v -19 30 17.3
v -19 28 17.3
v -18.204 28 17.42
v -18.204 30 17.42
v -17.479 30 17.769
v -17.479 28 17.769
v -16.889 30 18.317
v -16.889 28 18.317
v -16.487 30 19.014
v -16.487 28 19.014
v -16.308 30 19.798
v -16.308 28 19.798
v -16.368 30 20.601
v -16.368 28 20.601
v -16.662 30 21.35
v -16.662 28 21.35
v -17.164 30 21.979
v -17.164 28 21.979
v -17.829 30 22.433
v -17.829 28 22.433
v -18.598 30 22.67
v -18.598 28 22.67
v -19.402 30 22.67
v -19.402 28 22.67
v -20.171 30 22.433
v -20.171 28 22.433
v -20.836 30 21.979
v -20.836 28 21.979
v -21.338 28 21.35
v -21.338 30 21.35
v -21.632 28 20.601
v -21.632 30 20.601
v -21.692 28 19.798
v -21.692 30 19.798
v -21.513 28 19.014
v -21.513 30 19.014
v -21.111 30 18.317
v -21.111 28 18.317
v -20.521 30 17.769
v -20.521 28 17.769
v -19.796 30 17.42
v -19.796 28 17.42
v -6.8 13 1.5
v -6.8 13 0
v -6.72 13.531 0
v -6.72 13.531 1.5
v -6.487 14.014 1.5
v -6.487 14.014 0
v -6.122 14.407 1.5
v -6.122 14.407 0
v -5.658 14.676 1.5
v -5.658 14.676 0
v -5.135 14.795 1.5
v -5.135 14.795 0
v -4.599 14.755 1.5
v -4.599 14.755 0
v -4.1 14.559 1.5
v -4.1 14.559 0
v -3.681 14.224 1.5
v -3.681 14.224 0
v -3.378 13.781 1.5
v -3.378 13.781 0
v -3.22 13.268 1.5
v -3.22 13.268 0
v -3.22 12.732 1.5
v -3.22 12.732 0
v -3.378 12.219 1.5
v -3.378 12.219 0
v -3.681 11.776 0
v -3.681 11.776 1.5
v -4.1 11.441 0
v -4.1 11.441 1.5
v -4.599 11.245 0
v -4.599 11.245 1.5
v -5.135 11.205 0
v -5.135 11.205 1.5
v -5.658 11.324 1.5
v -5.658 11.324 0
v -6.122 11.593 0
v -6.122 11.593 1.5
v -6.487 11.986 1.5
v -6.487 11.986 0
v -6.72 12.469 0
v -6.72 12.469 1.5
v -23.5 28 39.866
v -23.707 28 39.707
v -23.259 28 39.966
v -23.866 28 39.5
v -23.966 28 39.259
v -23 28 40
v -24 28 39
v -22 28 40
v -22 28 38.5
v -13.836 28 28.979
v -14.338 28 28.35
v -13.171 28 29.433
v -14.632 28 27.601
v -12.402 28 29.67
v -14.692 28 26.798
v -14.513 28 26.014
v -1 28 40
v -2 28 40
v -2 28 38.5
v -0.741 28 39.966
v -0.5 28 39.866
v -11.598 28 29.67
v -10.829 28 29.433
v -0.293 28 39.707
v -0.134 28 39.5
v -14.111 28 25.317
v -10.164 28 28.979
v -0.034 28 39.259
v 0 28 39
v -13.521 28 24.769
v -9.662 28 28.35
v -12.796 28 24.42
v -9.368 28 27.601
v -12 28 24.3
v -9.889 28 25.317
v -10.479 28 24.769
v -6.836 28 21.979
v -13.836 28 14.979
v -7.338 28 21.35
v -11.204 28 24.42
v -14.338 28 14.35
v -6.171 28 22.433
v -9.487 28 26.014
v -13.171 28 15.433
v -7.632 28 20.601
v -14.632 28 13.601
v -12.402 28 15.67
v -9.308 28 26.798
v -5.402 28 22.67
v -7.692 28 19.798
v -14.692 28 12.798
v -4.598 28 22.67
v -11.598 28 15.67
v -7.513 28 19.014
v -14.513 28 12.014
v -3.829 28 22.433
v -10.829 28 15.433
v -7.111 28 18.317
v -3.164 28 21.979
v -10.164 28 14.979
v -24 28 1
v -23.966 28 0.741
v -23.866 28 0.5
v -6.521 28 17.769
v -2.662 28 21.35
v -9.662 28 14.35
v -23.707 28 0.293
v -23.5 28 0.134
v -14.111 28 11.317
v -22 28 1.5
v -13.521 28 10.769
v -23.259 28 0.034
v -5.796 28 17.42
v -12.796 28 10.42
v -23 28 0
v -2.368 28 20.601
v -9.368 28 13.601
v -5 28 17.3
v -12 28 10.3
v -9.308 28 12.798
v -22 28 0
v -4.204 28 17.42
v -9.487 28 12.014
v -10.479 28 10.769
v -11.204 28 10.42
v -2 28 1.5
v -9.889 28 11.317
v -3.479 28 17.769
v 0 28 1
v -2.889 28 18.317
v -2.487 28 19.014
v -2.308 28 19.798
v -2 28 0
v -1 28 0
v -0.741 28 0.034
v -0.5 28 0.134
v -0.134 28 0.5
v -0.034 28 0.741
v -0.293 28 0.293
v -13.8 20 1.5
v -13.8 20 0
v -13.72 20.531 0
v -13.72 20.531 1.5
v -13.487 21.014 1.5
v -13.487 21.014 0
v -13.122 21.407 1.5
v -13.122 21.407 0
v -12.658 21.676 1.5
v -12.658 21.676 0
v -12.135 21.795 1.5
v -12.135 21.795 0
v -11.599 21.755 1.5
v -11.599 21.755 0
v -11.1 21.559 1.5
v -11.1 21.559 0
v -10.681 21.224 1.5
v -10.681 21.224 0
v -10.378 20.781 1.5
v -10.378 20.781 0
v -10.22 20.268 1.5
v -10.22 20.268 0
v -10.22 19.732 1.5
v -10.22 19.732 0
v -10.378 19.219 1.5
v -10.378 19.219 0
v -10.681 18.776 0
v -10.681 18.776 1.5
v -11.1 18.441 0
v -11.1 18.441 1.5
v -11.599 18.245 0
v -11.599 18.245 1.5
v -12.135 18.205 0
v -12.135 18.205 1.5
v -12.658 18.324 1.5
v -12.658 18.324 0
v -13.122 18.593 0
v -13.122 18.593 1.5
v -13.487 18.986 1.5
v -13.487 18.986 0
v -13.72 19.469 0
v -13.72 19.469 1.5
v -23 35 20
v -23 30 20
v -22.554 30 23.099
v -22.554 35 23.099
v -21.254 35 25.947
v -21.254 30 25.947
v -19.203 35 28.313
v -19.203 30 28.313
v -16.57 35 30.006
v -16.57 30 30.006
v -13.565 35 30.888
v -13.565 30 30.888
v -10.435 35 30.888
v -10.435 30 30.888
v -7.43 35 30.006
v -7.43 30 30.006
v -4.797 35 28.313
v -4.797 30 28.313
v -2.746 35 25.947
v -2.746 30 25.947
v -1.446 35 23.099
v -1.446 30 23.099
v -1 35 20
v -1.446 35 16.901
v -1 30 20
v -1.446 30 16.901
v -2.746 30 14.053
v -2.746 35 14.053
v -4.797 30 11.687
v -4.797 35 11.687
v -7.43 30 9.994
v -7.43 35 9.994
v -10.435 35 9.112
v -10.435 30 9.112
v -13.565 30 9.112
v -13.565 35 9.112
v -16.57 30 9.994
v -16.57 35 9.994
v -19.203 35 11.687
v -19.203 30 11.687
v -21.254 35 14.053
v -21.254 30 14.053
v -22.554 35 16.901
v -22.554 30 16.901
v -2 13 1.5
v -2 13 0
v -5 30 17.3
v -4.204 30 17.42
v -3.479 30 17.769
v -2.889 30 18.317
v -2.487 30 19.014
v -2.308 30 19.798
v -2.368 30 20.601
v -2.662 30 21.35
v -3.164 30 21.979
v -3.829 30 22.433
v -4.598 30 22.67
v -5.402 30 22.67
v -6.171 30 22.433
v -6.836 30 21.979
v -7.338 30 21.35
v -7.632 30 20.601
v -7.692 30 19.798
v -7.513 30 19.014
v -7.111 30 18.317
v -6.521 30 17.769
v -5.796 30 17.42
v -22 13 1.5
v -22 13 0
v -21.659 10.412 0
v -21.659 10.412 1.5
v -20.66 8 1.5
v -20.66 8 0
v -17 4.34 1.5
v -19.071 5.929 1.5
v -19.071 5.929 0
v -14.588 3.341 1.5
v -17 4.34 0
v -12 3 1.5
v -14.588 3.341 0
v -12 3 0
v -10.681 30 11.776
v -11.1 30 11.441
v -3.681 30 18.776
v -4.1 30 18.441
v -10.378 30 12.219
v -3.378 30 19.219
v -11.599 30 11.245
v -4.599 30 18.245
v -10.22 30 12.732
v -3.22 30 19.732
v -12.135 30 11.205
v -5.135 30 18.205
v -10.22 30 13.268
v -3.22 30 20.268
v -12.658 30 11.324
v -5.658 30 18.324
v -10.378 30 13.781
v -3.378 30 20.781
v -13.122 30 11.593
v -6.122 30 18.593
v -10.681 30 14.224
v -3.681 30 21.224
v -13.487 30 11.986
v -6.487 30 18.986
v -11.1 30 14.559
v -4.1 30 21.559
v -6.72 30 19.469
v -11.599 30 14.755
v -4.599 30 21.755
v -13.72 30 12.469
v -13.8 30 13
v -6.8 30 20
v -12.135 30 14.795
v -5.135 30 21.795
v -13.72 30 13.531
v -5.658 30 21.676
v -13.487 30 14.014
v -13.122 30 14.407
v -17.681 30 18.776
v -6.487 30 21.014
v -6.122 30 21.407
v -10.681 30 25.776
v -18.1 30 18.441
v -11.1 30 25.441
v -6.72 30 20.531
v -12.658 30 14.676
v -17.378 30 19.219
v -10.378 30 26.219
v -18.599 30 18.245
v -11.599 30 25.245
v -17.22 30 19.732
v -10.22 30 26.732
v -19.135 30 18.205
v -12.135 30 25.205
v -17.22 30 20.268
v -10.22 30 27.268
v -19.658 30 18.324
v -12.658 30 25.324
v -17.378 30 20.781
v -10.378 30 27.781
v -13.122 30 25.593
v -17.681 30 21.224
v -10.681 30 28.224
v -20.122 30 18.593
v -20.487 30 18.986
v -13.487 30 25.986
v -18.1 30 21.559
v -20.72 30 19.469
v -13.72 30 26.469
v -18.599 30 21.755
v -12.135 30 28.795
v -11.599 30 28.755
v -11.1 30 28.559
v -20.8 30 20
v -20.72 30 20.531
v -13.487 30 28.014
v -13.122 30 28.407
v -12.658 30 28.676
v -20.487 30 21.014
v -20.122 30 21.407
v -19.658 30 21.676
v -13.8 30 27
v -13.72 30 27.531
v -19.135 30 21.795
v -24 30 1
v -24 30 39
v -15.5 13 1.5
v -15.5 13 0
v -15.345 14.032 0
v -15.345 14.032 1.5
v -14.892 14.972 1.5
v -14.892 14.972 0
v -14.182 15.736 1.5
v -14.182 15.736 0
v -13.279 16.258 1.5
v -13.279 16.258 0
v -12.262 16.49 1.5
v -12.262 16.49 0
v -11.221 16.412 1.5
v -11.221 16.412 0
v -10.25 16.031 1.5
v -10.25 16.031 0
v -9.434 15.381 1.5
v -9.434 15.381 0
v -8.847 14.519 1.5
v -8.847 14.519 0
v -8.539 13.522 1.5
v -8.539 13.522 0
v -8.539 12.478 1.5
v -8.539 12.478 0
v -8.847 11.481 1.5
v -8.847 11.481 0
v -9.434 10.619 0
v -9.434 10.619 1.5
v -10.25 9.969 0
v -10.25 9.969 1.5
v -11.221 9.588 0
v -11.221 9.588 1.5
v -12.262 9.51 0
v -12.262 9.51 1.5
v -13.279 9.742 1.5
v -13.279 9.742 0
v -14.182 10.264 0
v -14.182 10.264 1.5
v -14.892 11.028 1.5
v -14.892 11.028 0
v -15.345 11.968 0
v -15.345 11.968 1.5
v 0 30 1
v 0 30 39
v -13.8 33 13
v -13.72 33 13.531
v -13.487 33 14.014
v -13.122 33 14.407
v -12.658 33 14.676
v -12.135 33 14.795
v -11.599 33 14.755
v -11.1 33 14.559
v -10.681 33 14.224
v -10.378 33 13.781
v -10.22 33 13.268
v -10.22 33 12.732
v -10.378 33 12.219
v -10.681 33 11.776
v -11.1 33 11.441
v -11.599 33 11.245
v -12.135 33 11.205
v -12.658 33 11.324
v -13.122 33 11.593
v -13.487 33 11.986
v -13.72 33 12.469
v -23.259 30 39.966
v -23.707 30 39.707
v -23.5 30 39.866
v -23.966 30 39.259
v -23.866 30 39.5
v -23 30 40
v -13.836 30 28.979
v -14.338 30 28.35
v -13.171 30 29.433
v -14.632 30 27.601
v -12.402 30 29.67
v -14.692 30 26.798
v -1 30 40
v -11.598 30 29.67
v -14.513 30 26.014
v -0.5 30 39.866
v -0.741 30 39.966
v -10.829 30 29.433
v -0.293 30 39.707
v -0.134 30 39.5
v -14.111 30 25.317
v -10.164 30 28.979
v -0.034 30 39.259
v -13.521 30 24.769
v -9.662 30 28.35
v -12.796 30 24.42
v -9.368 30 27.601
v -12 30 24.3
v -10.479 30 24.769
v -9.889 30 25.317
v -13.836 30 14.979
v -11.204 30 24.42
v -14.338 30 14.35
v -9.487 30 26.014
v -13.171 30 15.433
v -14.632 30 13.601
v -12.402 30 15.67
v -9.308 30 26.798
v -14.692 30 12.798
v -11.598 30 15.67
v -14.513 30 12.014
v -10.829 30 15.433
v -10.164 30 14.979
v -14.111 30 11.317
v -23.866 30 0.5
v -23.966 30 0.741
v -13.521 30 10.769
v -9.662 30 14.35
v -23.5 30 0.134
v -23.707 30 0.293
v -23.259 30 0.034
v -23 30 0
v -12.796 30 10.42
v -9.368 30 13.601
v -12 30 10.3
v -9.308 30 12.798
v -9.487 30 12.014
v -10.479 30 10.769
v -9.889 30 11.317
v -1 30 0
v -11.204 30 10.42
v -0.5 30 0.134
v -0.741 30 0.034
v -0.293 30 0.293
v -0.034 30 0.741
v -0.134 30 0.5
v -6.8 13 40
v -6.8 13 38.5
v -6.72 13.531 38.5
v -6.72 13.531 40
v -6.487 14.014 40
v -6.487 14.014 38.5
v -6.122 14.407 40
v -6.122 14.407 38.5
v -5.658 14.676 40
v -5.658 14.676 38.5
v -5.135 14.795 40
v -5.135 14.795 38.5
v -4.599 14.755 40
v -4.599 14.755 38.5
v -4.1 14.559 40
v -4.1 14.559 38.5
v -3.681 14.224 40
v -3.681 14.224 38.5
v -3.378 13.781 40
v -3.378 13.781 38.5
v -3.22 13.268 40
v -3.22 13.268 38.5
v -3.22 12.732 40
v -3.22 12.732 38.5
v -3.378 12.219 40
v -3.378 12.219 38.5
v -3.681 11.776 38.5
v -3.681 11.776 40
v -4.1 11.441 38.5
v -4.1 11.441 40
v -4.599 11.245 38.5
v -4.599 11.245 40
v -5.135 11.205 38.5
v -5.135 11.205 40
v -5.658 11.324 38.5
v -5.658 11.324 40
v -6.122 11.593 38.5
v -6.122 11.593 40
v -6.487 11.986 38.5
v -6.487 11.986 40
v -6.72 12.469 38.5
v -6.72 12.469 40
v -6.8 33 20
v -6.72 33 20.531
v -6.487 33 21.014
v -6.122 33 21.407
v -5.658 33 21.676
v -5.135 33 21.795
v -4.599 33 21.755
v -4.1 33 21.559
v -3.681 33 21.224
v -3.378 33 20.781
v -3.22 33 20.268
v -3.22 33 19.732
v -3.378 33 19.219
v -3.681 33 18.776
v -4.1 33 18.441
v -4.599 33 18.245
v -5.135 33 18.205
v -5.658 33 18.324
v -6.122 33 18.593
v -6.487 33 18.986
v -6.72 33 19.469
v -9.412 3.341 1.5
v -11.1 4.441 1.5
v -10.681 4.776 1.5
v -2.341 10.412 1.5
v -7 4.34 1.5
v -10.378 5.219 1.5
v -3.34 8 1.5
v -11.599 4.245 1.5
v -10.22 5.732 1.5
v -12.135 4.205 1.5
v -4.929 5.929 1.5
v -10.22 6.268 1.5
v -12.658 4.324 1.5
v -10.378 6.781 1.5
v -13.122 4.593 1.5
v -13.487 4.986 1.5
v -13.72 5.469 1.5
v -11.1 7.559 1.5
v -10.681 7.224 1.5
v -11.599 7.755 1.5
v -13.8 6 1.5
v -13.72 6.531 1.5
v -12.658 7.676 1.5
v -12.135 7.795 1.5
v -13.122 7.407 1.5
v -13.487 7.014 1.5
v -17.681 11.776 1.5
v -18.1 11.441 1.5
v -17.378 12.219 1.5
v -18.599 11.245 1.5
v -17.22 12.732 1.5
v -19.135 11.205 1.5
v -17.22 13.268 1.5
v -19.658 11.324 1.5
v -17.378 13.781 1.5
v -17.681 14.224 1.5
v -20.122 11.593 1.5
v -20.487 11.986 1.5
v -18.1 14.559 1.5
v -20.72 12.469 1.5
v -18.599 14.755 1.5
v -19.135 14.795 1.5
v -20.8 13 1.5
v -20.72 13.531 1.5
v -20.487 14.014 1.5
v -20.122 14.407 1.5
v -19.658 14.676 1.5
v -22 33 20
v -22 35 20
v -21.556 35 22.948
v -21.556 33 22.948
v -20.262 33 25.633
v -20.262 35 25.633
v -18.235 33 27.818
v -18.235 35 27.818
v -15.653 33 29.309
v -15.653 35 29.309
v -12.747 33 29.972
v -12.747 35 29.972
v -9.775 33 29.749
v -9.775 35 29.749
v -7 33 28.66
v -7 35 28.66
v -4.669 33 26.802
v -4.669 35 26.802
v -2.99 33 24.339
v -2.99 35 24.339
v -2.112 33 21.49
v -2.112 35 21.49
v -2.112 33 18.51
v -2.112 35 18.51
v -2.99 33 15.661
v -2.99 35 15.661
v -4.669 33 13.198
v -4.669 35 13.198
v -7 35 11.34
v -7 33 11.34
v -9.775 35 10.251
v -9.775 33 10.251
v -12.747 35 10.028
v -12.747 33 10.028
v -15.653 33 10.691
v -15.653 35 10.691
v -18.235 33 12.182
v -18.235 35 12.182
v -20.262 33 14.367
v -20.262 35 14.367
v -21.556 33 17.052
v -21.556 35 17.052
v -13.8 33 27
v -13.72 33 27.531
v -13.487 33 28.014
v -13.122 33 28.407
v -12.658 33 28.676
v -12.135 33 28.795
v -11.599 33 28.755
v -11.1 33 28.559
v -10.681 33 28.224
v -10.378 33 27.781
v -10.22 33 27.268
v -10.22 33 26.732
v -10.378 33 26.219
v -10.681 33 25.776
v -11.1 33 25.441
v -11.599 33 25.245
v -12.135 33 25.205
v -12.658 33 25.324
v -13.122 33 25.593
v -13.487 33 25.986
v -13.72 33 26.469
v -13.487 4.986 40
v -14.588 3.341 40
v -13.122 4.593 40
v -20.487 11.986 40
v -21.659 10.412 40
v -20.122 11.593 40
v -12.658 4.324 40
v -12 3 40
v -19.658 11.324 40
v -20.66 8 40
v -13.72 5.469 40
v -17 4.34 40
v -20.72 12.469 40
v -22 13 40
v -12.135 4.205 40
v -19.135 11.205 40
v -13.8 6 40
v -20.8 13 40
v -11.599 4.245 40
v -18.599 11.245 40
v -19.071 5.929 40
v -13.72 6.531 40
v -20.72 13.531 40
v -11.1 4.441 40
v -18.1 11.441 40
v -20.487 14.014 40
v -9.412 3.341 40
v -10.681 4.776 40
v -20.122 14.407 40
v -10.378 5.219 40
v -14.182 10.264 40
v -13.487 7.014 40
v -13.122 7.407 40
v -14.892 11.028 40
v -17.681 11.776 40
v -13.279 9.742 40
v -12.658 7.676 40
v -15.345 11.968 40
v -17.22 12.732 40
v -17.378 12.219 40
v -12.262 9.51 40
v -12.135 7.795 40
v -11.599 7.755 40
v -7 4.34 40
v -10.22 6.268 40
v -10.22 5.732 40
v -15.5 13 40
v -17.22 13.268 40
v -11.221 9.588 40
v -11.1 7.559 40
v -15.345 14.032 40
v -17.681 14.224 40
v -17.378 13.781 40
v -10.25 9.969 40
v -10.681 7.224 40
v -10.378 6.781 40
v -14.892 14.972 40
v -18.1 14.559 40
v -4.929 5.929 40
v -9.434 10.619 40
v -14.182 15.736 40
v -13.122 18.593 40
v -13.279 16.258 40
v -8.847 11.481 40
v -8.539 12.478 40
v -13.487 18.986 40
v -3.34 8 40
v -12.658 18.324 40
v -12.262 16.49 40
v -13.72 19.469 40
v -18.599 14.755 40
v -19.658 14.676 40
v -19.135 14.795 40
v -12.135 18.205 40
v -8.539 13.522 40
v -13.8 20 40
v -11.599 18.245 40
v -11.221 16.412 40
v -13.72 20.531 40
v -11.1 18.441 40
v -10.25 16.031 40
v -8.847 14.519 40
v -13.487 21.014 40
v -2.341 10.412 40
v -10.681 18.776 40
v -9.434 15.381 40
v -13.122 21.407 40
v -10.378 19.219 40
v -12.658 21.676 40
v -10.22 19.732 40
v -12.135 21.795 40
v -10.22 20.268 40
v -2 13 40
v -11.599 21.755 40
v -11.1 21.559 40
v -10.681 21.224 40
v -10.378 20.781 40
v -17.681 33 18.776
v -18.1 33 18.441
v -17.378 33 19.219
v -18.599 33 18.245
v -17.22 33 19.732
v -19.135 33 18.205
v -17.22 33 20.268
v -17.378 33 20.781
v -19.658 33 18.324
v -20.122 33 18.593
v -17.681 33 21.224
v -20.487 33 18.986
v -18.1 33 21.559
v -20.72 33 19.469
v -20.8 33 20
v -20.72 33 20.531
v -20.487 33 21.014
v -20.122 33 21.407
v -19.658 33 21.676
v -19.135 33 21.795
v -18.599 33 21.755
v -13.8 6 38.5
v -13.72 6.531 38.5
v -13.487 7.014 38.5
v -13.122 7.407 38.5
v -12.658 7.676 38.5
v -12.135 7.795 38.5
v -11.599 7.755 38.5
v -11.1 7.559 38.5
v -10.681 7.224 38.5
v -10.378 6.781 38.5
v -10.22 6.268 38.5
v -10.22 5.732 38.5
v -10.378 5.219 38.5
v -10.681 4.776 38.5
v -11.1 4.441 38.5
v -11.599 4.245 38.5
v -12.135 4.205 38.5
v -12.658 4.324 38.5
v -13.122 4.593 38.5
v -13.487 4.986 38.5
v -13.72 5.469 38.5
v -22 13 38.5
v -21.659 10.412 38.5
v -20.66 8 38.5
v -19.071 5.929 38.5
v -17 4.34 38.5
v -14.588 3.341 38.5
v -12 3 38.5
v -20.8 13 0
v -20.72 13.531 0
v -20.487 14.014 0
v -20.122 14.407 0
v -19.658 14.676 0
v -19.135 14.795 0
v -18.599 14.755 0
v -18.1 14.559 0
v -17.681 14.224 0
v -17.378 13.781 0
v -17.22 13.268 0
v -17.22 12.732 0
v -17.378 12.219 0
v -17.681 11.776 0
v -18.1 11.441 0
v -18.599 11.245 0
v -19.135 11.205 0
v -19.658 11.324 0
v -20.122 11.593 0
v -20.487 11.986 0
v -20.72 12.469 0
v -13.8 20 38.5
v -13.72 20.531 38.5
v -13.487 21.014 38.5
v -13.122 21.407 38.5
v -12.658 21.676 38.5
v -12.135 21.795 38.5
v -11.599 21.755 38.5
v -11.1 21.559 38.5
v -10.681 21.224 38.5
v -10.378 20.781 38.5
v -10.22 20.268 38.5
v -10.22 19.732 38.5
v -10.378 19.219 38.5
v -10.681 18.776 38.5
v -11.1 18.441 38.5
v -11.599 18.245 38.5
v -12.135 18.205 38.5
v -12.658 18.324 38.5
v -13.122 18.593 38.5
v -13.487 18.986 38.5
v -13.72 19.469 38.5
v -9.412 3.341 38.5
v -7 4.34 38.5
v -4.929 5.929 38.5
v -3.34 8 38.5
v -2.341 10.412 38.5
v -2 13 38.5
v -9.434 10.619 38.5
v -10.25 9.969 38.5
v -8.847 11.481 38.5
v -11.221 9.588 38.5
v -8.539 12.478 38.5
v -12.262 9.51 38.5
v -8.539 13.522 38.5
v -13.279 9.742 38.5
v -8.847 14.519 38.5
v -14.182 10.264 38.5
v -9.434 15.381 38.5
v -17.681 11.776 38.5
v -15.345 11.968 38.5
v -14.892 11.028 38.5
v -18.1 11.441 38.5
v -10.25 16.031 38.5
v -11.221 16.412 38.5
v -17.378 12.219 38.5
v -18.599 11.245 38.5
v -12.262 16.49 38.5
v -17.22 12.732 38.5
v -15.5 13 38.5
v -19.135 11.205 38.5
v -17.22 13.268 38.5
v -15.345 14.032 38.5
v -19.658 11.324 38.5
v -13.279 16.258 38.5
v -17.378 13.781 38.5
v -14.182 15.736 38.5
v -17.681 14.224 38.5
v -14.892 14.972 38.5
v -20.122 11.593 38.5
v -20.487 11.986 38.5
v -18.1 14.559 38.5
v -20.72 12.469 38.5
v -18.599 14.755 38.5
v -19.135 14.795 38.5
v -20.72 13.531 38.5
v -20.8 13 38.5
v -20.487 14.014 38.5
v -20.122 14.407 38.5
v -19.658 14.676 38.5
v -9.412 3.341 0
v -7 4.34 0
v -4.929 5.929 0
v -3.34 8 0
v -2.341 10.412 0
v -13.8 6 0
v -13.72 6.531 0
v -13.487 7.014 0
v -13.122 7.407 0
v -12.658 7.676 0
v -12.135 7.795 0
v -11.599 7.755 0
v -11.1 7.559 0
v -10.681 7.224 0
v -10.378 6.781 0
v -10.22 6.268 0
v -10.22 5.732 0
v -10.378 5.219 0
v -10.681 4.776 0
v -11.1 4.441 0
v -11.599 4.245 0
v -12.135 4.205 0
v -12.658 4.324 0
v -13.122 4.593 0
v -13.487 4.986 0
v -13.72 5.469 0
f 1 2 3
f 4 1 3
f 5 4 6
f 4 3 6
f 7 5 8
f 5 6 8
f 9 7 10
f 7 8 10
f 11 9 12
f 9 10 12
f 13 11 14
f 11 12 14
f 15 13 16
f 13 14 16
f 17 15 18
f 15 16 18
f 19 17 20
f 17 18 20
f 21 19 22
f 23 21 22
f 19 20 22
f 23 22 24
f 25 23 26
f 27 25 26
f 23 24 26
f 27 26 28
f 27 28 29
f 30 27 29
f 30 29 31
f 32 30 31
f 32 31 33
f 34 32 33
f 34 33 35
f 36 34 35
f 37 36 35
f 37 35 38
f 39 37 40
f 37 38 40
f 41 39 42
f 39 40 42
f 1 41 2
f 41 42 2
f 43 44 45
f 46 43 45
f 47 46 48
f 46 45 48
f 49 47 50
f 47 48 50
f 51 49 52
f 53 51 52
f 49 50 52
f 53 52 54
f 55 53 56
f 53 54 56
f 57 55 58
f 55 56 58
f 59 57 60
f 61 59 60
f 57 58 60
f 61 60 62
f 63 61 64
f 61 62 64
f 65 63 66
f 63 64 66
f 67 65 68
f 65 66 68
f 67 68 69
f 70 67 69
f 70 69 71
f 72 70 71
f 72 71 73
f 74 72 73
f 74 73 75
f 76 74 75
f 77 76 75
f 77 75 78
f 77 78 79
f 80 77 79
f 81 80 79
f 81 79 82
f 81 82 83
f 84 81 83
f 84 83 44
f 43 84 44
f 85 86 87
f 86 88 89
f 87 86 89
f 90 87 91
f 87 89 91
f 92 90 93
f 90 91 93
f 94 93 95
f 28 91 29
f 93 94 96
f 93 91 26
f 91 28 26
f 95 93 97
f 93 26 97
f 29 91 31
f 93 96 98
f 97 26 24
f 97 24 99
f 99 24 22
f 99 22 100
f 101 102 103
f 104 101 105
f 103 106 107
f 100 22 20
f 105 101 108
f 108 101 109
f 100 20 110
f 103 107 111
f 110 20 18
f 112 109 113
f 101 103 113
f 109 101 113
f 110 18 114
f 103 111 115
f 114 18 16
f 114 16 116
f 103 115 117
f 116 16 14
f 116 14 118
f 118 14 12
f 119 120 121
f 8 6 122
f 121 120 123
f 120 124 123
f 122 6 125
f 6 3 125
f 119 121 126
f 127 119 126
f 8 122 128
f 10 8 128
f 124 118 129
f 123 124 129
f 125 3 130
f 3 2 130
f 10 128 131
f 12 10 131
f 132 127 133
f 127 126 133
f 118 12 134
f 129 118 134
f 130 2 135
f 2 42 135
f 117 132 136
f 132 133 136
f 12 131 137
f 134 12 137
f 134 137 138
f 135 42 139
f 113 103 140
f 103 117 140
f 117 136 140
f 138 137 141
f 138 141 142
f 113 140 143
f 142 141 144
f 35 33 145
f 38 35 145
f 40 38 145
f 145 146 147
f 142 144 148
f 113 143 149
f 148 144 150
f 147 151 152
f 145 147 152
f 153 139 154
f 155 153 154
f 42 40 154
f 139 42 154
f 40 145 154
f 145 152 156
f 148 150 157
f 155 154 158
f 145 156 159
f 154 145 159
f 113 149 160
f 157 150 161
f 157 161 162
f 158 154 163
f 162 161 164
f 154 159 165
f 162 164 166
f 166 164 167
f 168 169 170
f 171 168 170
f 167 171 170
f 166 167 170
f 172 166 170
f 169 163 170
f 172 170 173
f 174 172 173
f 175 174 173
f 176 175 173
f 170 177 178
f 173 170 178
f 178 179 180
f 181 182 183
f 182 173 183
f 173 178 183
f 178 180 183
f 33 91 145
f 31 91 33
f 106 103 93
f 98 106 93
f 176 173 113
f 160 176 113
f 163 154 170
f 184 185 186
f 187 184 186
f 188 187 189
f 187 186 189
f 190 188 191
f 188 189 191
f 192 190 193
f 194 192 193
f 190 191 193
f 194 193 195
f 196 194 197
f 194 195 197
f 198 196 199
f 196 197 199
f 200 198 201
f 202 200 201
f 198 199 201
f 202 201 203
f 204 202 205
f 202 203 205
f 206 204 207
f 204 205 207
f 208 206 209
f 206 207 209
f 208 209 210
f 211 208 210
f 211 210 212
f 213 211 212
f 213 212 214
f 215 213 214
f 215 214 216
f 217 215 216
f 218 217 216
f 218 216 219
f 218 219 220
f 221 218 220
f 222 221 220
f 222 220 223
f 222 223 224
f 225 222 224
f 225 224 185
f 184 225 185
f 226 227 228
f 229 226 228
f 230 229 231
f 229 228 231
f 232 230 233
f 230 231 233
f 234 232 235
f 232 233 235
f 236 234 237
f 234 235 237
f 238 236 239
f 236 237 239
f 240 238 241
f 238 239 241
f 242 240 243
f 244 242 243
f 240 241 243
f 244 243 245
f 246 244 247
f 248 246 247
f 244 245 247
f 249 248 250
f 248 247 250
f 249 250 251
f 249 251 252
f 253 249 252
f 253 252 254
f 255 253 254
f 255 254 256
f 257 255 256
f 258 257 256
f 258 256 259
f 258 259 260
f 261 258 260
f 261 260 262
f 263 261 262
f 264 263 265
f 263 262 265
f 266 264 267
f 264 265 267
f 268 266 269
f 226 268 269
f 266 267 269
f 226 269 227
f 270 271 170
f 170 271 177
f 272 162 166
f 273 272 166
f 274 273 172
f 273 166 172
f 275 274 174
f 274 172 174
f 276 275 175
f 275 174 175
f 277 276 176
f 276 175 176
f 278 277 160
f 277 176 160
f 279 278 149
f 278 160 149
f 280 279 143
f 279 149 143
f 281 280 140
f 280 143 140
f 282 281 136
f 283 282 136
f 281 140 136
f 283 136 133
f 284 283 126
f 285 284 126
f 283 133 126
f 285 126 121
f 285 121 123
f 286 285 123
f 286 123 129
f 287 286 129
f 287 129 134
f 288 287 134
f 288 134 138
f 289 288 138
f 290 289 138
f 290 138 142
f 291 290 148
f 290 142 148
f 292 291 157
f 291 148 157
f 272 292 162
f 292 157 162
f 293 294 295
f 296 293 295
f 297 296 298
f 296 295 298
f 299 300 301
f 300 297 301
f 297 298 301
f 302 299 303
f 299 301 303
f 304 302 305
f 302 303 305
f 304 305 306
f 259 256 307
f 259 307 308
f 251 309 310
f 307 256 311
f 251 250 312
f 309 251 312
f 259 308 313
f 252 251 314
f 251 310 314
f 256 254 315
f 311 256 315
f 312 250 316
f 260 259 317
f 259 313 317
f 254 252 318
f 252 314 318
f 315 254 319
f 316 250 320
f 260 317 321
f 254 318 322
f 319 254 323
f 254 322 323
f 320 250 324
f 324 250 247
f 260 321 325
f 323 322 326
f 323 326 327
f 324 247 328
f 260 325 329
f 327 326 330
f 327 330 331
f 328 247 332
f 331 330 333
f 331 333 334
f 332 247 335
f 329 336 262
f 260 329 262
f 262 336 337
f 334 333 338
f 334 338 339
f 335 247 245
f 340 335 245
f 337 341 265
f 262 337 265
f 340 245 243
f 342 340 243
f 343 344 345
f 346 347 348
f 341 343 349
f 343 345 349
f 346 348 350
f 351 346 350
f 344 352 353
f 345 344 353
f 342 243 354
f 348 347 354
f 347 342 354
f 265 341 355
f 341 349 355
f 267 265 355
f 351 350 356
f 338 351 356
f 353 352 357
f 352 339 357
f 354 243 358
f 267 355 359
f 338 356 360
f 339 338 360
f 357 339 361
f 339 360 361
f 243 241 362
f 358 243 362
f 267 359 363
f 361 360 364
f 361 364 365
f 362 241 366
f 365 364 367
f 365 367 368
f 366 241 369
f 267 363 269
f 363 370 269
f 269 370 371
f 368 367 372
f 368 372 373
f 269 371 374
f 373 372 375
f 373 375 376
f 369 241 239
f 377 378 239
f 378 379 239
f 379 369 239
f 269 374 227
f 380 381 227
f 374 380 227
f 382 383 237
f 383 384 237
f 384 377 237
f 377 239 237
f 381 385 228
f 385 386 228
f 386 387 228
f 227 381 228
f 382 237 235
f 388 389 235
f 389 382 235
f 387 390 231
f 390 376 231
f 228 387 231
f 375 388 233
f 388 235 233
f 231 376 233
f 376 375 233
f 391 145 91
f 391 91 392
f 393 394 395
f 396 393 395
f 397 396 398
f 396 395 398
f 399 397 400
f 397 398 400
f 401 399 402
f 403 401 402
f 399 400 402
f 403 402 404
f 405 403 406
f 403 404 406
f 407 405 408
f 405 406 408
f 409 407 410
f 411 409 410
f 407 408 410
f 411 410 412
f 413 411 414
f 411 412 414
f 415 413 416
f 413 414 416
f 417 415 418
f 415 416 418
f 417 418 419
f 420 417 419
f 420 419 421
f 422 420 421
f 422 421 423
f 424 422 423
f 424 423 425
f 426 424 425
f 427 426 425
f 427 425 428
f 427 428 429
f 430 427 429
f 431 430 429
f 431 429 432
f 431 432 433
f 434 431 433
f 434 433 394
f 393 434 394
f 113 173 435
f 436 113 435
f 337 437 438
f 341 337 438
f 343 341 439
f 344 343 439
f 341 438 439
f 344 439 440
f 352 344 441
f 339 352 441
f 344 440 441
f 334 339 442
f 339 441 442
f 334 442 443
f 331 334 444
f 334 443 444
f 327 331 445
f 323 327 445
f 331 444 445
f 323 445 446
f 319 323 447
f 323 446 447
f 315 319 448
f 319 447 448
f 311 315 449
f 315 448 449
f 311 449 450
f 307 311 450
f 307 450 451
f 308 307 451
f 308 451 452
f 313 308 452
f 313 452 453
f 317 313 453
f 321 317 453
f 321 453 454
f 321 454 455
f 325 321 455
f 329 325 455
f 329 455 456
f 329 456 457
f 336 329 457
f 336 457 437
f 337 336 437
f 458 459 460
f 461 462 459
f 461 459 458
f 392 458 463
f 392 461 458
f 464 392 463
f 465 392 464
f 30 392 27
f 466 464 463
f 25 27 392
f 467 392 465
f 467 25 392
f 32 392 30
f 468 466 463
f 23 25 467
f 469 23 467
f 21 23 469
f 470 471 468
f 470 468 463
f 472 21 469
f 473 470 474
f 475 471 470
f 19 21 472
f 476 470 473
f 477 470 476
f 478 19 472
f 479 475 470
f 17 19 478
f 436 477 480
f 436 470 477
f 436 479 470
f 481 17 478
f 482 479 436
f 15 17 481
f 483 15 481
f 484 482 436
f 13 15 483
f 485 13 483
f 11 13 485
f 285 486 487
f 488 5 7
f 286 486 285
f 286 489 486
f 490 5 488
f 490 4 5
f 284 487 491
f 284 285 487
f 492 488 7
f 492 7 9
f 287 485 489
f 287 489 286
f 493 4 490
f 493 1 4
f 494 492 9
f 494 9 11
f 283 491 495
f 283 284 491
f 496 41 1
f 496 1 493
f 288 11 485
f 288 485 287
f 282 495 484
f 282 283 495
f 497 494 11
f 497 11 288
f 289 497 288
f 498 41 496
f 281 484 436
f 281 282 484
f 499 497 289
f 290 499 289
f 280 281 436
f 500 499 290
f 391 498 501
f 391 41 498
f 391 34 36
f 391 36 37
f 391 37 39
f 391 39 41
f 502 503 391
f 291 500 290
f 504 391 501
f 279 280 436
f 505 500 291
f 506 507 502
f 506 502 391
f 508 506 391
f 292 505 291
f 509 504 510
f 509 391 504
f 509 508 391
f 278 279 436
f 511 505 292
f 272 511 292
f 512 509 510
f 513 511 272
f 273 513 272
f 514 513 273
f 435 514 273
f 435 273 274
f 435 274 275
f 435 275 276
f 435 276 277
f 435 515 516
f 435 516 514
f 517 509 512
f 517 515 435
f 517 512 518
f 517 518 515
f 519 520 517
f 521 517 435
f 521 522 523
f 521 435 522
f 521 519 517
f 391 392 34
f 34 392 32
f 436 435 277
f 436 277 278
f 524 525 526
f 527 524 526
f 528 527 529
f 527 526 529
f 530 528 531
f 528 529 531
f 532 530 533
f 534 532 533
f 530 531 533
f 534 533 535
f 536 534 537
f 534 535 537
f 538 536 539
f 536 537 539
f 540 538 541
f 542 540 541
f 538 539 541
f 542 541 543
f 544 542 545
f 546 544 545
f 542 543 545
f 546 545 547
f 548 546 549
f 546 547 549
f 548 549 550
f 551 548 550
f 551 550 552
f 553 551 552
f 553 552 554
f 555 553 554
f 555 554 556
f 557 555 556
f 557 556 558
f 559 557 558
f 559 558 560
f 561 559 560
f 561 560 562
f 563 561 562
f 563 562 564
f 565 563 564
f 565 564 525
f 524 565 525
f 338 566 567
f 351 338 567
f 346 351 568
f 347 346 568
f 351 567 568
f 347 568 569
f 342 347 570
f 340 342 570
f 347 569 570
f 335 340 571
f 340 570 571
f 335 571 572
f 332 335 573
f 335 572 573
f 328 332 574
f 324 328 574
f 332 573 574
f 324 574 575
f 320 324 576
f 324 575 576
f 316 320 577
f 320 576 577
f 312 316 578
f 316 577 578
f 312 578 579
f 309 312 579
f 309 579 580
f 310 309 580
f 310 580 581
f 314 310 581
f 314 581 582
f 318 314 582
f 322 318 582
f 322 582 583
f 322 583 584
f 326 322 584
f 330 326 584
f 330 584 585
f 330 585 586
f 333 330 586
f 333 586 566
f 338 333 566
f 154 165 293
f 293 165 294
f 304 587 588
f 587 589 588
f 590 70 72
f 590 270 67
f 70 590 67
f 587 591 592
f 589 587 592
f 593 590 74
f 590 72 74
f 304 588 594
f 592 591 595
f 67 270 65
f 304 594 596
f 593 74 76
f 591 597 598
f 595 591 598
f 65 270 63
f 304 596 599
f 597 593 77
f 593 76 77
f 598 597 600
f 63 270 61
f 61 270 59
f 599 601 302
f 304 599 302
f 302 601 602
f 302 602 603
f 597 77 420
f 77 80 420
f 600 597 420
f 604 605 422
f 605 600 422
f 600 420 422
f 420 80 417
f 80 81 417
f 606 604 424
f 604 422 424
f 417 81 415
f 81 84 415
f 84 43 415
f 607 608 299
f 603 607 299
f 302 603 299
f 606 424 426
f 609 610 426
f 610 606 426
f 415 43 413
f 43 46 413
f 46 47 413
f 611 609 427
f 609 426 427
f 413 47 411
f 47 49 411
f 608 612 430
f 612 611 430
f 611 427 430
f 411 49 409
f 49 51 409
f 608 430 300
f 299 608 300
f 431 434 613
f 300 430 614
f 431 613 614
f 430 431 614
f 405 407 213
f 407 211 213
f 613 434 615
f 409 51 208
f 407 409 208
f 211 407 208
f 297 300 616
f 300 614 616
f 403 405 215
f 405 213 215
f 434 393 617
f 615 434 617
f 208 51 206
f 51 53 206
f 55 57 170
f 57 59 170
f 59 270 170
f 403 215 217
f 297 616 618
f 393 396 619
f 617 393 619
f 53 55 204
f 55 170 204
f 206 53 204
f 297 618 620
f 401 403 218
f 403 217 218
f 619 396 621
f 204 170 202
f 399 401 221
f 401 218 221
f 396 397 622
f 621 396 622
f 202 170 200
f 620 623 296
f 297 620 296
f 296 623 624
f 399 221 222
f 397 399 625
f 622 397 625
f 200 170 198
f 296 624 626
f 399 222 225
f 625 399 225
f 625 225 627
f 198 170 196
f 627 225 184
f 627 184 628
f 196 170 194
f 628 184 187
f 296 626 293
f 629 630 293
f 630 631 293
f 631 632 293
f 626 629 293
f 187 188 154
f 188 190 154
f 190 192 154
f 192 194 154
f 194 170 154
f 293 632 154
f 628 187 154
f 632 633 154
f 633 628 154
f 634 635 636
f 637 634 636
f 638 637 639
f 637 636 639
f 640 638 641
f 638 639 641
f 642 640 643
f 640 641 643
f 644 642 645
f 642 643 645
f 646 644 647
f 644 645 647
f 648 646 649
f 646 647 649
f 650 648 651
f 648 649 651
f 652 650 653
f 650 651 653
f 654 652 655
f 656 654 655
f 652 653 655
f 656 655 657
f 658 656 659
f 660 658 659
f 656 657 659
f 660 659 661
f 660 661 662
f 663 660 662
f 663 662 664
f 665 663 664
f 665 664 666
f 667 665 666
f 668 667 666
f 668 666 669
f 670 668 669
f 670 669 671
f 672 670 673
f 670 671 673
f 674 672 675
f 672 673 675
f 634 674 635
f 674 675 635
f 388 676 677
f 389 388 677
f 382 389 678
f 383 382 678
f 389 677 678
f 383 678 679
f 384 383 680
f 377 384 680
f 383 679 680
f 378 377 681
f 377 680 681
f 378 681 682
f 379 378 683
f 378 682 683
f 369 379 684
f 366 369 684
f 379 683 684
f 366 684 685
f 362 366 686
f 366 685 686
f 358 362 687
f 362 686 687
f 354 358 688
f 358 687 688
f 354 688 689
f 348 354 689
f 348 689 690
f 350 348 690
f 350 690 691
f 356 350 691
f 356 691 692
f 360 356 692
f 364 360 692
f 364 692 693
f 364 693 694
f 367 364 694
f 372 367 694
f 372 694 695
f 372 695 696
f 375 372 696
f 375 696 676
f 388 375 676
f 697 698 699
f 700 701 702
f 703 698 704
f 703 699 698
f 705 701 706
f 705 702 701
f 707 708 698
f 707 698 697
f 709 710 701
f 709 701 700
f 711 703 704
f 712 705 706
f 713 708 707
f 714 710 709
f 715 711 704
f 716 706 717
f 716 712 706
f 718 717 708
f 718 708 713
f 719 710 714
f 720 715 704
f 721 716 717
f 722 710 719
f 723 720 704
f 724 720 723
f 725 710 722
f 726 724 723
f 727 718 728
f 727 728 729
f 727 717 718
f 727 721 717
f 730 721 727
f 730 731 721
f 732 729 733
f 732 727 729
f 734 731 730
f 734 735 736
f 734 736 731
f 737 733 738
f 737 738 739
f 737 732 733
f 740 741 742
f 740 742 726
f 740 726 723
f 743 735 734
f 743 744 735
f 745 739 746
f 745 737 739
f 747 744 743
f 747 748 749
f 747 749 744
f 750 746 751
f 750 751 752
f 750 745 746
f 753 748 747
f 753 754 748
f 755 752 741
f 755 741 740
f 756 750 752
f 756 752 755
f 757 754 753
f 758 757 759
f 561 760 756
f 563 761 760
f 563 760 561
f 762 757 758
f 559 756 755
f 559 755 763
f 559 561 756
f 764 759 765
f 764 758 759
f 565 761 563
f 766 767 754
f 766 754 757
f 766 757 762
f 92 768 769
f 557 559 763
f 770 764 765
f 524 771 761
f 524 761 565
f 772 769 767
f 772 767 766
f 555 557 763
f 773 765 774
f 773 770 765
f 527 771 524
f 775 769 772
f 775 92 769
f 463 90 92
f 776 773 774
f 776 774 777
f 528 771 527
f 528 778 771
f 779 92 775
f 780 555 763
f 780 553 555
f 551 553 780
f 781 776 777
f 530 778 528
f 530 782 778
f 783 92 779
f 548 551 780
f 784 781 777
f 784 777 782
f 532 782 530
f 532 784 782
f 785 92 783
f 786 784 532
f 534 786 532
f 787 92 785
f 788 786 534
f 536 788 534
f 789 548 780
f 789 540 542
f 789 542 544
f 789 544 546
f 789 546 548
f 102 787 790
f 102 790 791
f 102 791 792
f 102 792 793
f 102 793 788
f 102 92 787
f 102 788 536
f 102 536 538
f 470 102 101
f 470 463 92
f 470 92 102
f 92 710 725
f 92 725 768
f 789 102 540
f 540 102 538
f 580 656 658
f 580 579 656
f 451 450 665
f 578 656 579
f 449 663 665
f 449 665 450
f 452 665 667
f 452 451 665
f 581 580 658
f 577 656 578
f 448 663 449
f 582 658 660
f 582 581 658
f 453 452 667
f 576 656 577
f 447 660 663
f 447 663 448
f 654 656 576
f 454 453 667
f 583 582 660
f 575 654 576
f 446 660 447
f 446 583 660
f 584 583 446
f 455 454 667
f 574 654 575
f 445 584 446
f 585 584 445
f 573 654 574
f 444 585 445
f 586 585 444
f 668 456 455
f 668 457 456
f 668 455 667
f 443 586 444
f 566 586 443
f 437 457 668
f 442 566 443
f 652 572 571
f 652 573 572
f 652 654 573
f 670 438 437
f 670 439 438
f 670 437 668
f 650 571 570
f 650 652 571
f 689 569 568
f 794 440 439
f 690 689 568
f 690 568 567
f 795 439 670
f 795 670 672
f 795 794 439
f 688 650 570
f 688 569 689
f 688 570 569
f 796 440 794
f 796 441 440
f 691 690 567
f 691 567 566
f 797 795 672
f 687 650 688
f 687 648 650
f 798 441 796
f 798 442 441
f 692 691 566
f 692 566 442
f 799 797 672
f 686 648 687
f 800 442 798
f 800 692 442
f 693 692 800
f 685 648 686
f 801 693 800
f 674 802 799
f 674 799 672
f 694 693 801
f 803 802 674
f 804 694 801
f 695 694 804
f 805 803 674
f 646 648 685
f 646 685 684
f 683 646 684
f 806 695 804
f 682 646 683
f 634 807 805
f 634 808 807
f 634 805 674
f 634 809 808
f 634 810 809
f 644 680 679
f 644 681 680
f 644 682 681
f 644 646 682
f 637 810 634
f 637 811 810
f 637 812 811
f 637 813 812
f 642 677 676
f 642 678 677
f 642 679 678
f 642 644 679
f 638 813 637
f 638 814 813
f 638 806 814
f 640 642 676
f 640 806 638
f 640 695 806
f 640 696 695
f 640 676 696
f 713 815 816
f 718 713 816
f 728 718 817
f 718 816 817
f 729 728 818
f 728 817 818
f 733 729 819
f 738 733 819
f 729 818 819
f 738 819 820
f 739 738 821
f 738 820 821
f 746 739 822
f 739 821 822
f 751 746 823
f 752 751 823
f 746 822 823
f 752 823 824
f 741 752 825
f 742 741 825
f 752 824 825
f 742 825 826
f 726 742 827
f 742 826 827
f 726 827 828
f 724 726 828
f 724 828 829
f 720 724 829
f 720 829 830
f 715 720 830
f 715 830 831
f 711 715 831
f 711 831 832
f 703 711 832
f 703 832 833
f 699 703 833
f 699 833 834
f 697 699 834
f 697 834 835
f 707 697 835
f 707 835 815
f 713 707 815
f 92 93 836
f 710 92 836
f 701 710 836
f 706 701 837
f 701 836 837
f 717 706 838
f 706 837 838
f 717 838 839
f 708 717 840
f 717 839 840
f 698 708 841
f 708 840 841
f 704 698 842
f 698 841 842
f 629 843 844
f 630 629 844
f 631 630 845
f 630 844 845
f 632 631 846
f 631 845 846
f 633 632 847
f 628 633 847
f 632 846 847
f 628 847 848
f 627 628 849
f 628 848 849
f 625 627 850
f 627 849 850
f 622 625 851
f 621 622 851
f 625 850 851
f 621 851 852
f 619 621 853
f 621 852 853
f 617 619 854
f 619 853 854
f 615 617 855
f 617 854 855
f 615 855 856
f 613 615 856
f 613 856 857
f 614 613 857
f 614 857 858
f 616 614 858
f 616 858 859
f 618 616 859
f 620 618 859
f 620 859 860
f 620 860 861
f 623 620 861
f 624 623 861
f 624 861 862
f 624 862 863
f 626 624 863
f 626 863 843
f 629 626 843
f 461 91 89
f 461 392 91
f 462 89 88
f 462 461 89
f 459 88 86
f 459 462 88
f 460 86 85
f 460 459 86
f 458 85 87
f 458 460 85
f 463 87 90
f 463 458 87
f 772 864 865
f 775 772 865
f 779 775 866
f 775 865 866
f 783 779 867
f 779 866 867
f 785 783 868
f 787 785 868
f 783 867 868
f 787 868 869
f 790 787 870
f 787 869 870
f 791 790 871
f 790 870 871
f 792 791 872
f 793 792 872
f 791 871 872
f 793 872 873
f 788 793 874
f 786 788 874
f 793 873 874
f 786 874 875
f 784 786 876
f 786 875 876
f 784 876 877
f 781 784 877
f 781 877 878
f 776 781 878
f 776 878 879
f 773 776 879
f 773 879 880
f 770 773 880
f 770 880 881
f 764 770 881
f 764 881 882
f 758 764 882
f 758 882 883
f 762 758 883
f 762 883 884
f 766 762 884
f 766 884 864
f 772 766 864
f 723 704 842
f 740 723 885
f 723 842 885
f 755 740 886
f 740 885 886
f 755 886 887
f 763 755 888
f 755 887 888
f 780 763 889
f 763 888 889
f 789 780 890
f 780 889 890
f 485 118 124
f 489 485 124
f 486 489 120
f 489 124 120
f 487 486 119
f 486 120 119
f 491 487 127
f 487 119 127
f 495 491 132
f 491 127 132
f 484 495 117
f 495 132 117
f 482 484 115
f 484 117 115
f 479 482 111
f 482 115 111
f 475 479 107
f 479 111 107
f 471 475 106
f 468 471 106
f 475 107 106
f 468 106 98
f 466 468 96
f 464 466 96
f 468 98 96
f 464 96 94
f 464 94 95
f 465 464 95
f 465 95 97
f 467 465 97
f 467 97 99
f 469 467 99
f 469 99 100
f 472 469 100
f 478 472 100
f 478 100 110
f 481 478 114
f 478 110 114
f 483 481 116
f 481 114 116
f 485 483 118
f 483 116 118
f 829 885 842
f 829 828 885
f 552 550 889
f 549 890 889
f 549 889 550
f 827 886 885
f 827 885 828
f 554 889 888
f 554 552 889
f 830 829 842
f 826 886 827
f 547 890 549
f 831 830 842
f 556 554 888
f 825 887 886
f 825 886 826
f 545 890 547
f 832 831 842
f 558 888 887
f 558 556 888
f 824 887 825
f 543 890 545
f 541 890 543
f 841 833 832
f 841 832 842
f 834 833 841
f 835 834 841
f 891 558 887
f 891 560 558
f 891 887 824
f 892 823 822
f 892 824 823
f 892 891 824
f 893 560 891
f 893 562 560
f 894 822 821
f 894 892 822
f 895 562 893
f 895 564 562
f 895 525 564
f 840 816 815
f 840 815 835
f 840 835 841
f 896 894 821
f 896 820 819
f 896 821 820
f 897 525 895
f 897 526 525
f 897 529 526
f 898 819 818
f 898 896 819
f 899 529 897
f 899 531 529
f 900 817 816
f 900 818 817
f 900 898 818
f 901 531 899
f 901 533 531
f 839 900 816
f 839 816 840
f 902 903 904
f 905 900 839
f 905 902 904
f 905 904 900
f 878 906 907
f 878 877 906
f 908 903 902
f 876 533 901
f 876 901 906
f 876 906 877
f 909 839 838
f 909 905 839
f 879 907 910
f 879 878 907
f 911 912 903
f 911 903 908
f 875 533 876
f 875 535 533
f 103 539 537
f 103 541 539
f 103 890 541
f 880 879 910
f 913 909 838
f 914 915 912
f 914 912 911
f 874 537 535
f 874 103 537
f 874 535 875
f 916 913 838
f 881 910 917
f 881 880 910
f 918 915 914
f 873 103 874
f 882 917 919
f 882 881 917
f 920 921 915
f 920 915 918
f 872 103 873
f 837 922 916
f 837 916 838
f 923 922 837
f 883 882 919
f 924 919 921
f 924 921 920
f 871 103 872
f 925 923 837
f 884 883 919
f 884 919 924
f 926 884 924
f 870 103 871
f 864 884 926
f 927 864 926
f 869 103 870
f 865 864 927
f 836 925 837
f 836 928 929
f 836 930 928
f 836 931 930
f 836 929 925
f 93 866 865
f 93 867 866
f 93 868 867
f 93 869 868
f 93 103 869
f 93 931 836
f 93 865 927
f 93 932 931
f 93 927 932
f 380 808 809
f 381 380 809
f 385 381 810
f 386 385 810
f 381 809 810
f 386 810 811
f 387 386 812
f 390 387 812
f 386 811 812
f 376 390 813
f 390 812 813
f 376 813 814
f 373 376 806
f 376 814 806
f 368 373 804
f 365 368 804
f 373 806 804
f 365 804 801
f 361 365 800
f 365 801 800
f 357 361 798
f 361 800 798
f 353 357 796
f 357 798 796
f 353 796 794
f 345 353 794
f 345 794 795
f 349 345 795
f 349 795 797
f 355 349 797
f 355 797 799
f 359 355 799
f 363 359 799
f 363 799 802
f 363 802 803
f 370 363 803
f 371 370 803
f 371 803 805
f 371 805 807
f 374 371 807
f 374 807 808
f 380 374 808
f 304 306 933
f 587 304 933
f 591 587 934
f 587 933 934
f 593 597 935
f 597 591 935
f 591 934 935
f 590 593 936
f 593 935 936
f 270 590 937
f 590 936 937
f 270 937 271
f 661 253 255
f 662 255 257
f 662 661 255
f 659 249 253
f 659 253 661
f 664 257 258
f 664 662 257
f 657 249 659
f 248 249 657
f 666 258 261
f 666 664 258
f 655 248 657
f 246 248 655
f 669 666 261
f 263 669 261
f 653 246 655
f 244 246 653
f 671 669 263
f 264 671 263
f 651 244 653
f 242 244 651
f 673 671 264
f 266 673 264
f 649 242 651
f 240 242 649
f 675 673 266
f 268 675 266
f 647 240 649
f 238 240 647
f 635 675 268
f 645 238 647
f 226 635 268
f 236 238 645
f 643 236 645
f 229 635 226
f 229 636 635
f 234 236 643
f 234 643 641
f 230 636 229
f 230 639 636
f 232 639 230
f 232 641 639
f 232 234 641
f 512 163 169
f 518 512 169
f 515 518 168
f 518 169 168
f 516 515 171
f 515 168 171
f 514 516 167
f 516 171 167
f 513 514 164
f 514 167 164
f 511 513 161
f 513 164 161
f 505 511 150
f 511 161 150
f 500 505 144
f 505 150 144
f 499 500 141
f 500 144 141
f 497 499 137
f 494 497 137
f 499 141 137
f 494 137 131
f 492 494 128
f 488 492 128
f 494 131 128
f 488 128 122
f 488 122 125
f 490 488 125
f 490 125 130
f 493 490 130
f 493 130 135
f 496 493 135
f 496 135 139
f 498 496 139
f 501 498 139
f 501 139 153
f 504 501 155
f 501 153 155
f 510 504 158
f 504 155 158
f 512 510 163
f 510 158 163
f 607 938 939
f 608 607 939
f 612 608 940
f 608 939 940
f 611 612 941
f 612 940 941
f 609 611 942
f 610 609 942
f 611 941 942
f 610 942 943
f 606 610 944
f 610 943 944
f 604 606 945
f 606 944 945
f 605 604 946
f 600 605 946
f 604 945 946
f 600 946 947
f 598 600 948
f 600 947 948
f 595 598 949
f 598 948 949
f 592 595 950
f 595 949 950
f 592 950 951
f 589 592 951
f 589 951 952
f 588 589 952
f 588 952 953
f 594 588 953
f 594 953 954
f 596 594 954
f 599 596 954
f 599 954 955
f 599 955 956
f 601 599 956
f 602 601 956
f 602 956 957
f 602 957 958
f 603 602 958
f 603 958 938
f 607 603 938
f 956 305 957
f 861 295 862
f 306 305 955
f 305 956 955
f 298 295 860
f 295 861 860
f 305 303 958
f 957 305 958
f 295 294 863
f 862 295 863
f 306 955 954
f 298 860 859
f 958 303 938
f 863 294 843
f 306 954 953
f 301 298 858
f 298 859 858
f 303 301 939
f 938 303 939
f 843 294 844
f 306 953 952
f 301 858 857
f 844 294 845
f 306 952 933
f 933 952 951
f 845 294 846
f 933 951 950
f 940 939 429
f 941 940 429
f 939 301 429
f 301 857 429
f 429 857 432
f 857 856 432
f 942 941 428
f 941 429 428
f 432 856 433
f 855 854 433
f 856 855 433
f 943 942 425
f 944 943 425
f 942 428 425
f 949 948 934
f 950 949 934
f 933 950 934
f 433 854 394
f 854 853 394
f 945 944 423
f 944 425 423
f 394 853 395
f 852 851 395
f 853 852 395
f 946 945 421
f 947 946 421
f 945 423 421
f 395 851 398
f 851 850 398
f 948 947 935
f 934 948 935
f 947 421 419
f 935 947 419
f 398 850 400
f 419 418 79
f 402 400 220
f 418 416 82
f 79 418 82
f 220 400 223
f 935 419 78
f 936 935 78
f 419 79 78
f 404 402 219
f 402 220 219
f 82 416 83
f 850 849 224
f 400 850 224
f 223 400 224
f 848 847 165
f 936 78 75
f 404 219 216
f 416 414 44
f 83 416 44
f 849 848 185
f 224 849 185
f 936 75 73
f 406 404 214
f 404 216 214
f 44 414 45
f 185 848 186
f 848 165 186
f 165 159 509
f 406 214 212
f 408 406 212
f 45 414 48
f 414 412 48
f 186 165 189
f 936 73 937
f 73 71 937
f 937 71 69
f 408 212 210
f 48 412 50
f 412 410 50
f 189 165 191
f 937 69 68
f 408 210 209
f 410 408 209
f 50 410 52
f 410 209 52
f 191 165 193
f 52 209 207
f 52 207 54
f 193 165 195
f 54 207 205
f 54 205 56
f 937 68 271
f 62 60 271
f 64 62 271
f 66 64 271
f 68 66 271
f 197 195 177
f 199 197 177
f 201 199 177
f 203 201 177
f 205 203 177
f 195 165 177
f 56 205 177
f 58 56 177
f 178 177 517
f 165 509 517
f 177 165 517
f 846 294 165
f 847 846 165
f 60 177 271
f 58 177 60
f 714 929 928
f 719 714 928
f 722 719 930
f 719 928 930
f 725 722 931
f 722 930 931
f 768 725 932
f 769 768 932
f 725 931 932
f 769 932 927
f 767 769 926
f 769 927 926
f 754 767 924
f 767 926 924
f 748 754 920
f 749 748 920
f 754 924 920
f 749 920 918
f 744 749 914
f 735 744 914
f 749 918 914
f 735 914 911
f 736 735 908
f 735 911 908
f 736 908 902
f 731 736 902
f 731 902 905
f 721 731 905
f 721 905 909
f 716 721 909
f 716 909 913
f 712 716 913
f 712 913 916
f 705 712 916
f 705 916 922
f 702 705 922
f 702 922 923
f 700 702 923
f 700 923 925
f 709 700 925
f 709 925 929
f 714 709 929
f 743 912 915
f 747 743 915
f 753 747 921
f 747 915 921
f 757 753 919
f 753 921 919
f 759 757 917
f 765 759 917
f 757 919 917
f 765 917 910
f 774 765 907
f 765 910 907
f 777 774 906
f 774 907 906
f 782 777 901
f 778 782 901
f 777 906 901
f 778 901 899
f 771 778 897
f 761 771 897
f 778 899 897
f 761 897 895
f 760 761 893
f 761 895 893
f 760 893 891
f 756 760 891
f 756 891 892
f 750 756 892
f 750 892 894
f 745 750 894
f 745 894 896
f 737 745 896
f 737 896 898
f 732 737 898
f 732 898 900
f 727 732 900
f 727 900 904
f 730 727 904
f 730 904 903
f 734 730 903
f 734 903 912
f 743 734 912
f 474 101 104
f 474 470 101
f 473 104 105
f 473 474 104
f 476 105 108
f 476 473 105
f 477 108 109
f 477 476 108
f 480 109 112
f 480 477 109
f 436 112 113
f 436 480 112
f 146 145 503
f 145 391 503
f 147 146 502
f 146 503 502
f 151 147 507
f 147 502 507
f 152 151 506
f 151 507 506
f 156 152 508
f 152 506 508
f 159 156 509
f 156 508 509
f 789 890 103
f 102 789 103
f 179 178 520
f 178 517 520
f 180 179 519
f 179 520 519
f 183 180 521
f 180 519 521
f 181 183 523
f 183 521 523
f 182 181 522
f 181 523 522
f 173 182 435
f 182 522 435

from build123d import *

# Parameters (mm, degrees)
SKETCH_1_W               = 24
SKETCH_1_H               = 30
EXTRUDE_1_DEPTH          = 40
CUT_EXTRUDE_1_DEPTH      = 56.461698495
CUT_EXTRUDE_2_DEPTH      = 18.5
CUT_EXTRUDE_2_DEPTH_BACK = 18.5
CUT_EXTRUDE_3_REACH      = 57.462
SKETCH_4_R               = 1.8
SKETCH_4_R_2             = 3.5
SKETCH_5_R               = 11
EXTRUDE_2_DEPTH          = 5
SKETCH_6_R               = 10
CUT_EXTRUDE_4_DEPTH      = 2
SKETCH_7_R               = 1.8
CUT_EXTRUDE_5_DEPTH      = 56.461698495
SKETCH_8_R               = 2.7
CUT_EXTRUDE_6_DEPTH      = 2
FILLET_1_R               = 1


with BuildPart() as part:
    # 草图1 → 凸台-拉伸1 (new body)
    with BuildSketch(Plane.XY):
        with Locations((-12, 15)):
            Rectangle(SKETCH_1_W, SKETCH_1_H)
    extrude(amount=EXTRUDE_1_DEPTH)

    # 草图2 → 切除-拉伸1 (cut, through all)
    with BuildSketch(Plane(origin=(0, 0, 0), x_dir=(-1, 0, 0), z_dir=(0, 0, -1))):
        with BuildLine():
            Line((0, 0), (12, 0))
            Line((12, 0), (12, 3))
            ThreePointArc((12, 3), (4.928932188, 5.928932188), (2, 13))
            Line((2, 13), (2, 28))
            Line((2, 28), (0, 28))
            Line((0, 28), (0, 0))
        make_face()
        with BuildLine():
            Line((12, 3), (12, 0))
            Line((12, 0), (24, 0))
            Line((24, 0), (24, 28))
            Line((24, 28), (22, 28))
            Line((22, 28), (22, 13))
            ThreePointArc((22, 13), (19.071067812, 5.928932188), (12, 3))
        make_face()
    extrude(amount=-CUT_EXTRUDE_1_DEPTH, mode=Mode.SUBTRACT)

    # 草图3 → 切除-拉伸2 (cut, two sides: drawn at the far end of the back side and taken through both)
    with BuildSketch(Plane(origin=(0, 0, 20), x_dir=(-1, 0, 0), z_dir=(0, 0, -1)).offset(-CUT_EXTRUDE_2_DEPTH_BACK)):
        with BuildLine():
            Line((2, 28), (2, 13))
            ThreePointArc((2, 13), (12, 3), (22, 13))
            Line((22, 13), (22, 28))
            Line((22, 28), (2, 28))
        make_face()
    extrude(amount=CUT_EXTRUDE_2_DEPTH + CUT_EXTRUDE_2_DEPTH_BACK, mode=Mode.SUBTRACT)

    # 切除-拉伸3: up to this face of the body (flat: up to its plane)
    cut_extrude_3_end = Plane(part.part.faces().sort_by_distance((-12, 17.655371512, 40))[0])
    # 草图4 → 切除-拉伸3 (cut, up to the picked face)
    with BuildSketch(Plane(origin=(0, 0, 0), x_dir=(-1, 0, 0), z_dir=(0, 0, -1)), mode=Mode.PRIVATE) as cut_extrude_3_sk1:
        with Locations((12, 6)):
            Circle(SKETCH_4_R)
    cut_extrude_3_tool1 = split(extrude(cut_extrude_3_sk1.sketch, amount=-CUT_EXTRUDE_3_REACH, mode=Mode.PRIVATE), bisect_by=cut_extrude_3_end, keep=Keep.BOTH, mode=Mode.PRIVATE)
    # 草图4 → 切除-拉伸3 (cut, up to the picked face)
    with BuildSketch(Plane(origin=(0, 0, 0), x_dir=(-1, 0, 0), z_dir=(0, 0, -1)), mode=Mode.PRIVATE) as cut_extrude_3_sk2:
        with Locations((12, 13)):
            Circle(SKETCH_4_R_2)
    cut_extrude_3_tool2 = split(extrude(cut_extrude_3_sk2.sketch, amount=-CUT_EXTRUDE_3_REACH, mode=Mode.PRIVATE), bisect_by=cut_extrude_3_end, keep=Keep.BOTH, mode=Mode.PRIVATE)
    # 草图4 → 切除-拉伸3 (cut, up to the picked face)
    with BuildSketch(Plane(origin=(0, 0, 0), x_dir=(-1, 0, 0), z_dir=(0, 0, -1)), mode=Mode.PRIVATE) as cut_extrude_3_sk3:
        with Locations((12, 20)):
            Circle(SKETCH_4_R)
    cut_extrude_3_tool3 = split(extrude(cut_extrude_3_sk3.sketch, amount=-CUT_EXTRUDE_3_REACH, mode=Mode.PRIVATE), bisect_by=cut_extrude_3_end, keep=Keep.BOTH, mode=Mode.PRIVATE)
    # 草图4 → 切除-拉伸3 (cut, up to the picked face)
    with BuildSketch(Plane(origin=(0, 0, 0), x_dir=(-1, 0, 0), z_dir=(0, 0, -1)), mode=Mode.PRIVATE) as cut_extrude_3_sk4:
        with Locations((19, 13)):
            Circle(SKETCH_4_R)
    cut_extrude_3_tool4 = split(extrude(cut_extrude_3_sk4.sketch, amount=-CUT_EXTRUDE_3_REACH, mode=Mode.PRIVATE), bisect_by=cut_extrude_3_end, keep=Keep.BOTH, mode=Mode.PRIVATE)
    # 草图4 → 切除-拉伸3 (cut, up to the picked face)
    with BuildSketch(Plane(origin=(0, 0, 0), x_dir=(-1, 0, 0), z_dir=(0, 0, -1)), mode=Mode.PRIVATE) as cut_extrude_3_sk5:
        with Locations((5, 13)):
            Circle(SKETCH_4_R)
    cut_extrude_3_tool5 = split(extrude(cut_extrude_3_sk5.sketch, amount=-CUT_EXTRUDE_3_REACH, mode=Mode.PRIVATE), bisect_by=cut_extrude_3_end, keep=Keep.BOTH, mode=Mode.PRIVATE)
    add(cut_extrude_3_tool1.solids().sort_by(Axis((-12, 6, 0), (0, 0, 1)))[0], mode=Mode.SUBTRACT)
    add(cut_extrude_3_tool2.solids().sort_by(Axis((-12, 13, 0), (0, 0, 1)))[0], mode=Mode.SUBTRACT)
    add(cut_extrude_3_tool3.solids().sort_by(Axis((-12, 20, 0), (0, 0, 1)))[0], mode=Mode.SUBTRACT)
    add(cut_extrude_3_tool4.solids().sort_by(Axis((-19, 13, 0), (0, 0, 1)))[0], mode=Mode.SUBTRACT)
    add(cut_extrude_3_tool5.solids().sort_by(Axis((-5, 13, 0), (0, 0, 1)))[0], mode=Mode.SUBTRACT)


with BuildPart() as body_2:
    # 草图5 → 凸台-拉伸2 (new body)
    with BuildSketch(Plane(origin=(0, 30, 0), x_dir=(1, 0, 0), z_dir=(0, 1, 0))):
        with Locations(Location((-12, -20, 0), (0, 0, 180))):
            Circle(SKETCH_5_R)
    extrude(amount=EXTRUDE_2_DEPTH)

    # 草图6 → 切除-拉伸4 (cut)
    with BuildSketch(Plane(origin=(0, 35, 0), x_dir=(1, 0, 0), z_dir=(0, 1, 0))):
        with Locations(Location((-12, -20, 0), (0, 0, 180))):
            Circle(SKETCH_6_R)
    extrude(amount=-CUT_EXTRUDE_4_DEPTH, mode=Mode.SUBTRACT)


with BuildPart() as cut_extrude_5_tool:
    # 草图7 → 切除-拉伸5 (new, through all)
    with BuildSketch(Plane(origin=(0, 33, 0), x_dir=(1, 0, 0), z_dir=(0, 1, 0))):
        with Locations(Location((-12, -13, 0), (0, 0, 180))):
            Circle(SKETCH_7_R)
        with Locations(Location((-5, -20, 0), (0, 0, 180))):
            Circle(SKETCH_7_R)
        with Locations(Location((-12, -27, 0), (0, 0, 180))):
            Circle(SKETCH_7_R)
        with Locations(Location((-19, -20, 0), (0, 0, 180))):
            Circle(SKETCH_7_R)
    extrude(amount=-CUT_EXTRUDE_5_DEPTH)


with BuildPart() as part_1:
    add(part.part)

    # 切除-拉伸5: cut by cut_extrude_5_tool
    add(cut_extrude_5_tool.part, mode=Mode.SUBTRACT)

    # 草图8 → 切除-拉伸6 (cut)
    with BuildSketch(Plane.XZ.offset(-28)):
        with Locations(Location((-12, 27, 0), (0, 0, 270))):
            Circle(SKETCH_8_R)
        with Locations(Location((-5, 20, 0), (0, 0, 270))):
            Circle(SKETCH_8_R)
        with Locations(Location((-19, 20, 0), (0, 0, 270))):
            Circle(SKETCH_8_R)
        with Locations(Location((-12, 13, 0), (0, 0, 270))):
            Circle(SKETCH_8_R)
    extrude(amount=-CUT_EXTRUDE_6_DEPTH, mode=Mode.SUBTRACT)

    # 圆角1
    fillet_1_edges = [part_1.edges().sort_by_distance(p)[0] for p in [
        (-24, 29, 40),
        (0, 29, 0),
        (0, 29, 40),
        (-24, 29, 0),
    ]]
    fillet(fillet_1_edges, radius=FILLET_1_R)


with BuildPart() as body_2_1:
    add(body_2.part)

    # 切除-拉伸5: cut by cut_extrude_5_tool
    add(cut_extrude_5_tool.part, mode=Mode.SUBTRACT)


solid = Compound([part_1.part, body_2_1.part])
